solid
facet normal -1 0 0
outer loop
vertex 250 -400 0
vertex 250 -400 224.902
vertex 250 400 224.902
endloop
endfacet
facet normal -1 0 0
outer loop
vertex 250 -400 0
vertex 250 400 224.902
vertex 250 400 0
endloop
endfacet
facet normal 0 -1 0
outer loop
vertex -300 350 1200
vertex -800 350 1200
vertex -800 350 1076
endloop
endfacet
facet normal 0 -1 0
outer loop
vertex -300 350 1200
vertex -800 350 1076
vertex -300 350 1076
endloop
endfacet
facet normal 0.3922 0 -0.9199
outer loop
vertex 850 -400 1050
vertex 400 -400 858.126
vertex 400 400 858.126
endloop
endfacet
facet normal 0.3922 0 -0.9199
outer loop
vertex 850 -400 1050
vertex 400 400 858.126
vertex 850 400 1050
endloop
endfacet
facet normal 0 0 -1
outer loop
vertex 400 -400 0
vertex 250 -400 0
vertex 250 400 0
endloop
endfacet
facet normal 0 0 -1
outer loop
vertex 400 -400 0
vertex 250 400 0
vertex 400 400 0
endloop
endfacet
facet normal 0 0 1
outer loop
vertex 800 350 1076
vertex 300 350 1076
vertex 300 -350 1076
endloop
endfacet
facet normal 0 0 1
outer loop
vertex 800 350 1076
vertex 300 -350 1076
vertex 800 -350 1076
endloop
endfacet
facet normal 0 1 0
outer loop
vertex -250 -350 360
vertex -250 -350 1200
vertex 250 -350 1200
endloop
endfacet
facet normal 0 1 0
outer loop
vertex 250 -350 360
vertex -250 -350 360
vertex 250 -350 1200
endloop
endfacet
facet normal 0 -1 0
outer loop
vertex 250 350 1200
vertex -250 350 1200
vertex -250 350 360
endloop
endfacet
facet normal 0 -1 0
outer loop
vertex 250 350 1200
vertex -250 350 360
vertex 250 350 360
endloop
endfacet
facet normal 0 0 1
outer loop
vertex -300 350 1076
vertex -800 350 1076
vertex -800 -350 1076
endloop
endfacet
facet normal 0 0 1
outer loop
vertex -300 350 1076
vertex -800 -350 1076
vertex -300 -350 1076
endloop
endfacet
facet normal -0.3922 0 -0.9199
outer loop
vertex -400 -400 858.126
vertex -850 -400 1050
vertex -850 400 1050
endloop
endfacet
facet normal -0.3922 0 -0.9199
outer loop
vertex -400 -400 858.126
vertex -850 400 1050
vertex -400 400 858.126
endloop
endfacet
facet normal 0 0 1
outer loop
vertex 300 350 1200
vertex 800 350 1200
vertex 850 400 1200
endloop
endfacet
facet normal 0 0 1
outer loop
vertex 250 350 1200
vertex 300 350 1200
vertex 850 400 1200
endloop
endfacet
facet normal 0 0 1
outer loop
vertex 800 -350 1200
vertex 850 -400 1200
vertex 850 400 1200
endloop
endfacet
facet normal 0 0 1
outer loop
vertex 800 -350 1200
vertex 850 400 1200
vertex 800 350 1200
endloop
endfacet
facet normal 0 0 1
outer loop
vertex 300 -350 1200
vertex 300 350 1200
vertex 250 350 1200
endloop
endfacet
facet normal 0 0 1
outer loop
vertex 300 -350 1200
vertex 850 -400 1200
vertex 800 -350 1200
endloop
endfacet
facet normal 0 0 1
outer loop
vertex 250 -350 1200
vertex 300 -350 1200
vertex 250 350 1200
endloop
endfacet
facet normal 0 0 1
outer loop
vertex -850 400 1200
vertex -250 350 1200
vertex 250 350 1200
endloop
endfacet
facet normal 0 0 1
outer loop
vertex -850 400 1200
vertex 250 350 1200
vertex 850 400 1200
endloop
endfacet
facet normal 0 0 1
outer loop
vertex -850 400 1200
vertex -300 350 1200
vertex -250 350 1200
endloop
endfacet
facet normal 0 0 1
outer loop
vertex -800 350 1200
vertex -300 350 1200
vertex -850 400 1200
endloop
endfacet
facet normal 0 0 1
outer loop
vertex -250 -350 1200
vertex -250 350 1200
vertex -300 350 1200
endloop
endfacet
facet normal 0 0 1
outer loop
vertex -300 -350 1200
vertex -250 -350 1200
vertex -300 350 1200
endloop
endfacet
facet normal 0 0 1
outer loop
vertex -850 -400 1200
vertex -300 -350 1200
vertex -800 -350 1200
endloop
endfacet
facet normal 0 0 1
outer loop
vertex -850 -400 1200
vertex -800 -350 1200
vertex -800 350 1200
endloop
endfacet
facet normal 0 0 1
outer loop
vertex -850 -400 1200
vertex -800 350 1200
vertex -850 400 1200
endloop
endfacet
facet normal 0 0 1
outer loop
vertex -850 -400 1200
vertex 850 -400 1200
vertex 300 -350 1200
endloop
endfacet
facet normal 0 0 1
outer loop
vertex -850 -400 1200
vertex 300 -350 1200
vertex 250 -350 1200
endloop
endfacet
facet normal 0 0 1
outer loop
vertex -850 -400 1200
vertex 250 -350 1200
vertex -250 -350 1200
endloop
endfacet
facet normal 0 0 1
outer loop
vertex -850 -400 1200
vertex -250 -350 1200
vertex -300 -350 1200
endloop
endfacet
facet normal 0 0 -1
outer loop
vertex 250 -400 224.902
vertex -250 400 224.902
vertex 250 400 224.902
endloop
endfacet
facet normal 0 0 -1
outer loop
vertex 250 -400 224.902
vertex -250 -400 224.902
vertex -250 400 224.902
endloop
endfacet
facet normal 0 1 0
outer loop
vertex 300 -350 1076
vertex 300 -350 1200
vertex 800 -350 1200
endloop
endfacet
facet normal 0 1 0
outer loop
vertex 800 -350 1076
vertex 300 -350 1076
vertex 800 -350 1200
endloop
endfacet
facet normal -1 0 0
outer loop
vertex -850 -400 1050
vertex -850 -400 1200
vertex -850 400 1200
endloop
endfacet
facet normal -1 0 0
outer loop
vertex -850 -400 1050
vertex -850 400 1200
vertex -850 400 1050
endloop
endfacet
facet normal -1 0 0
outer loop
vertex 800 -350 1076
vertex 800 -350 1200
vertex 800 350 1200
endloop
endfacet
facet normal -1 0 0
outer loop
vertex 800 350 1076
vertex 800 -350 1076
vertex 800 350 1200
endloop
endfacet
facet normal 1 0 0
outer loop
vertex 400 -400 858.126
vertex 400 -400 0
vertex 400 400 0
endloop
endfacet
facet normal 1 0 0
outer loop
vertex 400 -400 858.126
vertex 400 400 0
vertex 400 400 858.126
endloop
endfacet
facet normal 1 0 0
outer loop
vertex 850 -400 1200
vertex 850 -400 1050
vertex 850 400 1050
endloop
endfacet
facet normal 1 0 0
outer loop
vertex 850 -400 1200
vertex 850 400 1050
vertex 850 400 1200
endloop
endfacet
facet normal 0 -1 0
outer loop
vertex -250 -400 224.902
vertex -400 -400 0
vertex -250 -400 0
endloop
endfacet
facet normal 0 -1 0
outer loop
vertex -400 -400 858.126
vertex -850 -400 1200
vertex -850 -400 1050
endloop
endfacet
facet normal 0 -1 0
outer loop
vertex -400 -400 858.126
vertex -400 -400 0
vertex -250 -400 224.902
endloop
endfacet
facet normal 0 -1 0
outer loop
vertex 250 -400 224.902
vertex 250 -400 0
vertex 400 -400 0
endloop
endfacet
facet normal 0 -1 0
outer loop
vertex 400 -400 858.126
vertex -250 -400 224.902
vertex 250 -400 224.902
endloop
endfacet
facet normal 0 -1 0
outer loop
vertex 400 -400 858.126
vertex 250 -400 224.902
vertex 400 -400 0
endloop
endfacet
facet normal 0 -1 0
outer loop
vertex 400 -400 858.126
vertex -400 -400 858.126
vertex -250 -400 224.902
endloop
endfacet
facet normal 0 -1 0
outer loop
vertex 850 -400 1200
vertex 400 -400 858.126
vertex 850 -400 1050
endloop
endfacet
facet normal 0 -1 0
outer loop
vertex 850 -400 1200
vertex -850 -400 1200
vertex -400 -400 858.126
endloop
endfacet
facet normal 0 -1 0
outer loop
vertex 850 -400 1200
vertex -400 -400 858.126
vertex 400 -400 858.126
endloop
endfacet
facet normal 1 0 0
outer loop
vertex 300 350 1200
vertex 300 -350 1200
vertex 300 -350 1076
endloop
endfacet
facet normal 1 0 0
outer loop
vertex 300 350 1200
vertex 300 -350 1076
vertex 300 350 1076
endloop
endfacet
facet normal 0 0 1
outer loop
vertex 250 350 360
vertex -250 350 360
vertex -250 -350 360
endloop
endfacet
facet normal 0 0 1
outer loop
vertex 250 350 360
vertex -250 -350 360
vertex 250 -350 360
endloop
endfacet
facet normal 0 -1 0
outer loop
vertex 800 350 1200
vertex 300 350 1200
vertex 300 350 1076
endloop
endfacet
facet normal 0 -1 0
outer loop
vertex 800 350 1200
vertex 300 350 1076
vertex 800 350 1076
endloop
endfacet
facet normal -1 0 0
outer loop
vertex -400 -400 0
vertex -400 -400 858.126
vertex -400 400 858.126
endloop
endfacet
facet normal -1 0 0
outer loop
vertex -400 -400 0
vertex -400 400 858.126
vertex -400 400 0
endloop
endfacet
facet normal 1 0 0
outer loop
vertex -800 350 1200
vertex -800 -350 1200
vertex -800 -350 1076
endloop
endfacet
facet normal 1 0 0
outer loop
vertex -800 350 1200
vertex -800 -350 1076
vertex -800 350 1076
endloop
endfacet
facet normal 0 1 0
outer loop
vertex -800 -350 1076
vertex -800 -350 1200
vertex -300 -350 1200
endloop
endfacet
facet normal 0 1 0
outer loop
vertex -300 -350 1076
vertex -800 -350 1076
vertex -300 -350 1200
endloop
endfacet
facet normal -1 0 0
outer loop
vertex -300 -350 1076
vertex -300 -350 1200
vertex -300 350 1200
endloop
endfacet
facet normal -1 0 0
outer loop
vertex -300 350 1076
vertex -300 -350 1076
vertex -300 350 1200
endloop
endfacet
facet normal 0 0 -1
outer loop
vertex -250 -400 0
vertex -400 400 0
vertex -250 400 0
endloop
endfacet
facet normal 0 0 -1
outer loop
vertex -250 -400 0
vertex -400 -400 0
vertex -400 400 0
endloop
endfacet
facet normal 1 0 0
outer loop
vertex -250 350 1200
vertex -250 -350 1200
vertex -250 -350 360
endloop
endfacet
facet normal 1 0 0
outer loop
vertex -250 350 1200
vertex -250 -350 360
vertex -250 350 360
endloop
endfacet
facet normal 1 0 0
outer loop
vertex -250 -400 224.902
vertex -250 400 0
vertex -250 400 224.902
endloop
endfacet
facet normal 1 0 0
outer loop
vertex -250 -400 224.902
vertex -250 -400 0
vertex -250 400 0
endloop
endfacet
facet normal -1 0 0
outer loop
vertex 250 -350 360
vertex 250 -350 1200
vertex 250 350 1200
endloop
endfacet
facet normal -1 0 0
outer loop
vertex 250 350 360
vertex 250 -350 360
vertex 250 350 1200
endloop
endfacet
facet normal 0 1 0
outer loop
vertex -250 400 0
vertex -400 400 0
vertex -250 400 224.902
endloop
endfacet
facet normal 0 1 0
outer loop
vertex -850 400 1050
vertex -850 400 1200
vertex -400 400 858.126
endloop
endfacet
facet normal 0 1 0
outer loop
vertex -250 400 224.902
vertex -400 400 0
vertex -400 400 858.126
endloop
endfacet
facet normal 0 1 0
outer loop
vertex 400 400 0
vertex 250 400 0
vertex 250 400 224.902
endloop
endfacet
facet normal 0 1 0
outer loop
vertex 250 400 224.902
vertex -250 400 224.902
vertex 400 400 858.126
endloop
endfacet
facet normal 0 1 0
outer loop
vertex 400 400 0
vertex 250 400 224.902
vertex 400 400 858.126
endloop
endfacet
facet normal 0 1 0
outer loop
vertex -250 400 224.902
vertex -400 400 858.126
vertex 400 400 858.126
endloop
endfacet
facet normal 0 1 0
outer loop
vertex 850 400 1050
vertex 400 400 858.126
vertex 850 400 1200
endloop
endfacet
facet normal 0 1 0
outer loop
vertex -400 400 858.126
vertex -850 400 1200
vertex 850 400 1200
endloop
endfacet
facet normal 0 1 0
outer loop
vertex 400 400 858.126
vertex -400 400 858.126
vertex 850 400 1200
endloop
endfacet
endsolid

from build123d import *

# Parameters (mm, degrees)
F1_DEPTH = 400
F2_W     = 500
F2_H     = 700
F3_DEPTH = 840
F4_W     = 500
F4_H     = 700
F5_DEPTH = 124


with BuildPart() as f1:
    # F0 (on Front) → F1 (new body, symmetric)
    with BuildSketch(Plane.XZ):
        Polygon((-250, 224.901706), (0, 224.901706), (250, 224.901706), (250, 0), (400, 0), (400, 858.125869), (850, 1050), (850, 1200), (0, 1200), (-850, 1200), (-850, 1050), (-400, 858.125869), (-400, 0), (-250, 0), align=None)
    extrude(amount=F1_DEPTH, both=True)

    # F2 (on face) → F3 (cut)
    with BuildSketch(Plane.XY.offset(1200)):
        Rectangle(F2_W, F2_H)
    extrude(amount=-F3_DEPTH, mode=Mode.SUBTRACT)

    # F4 (on face) → F5 (cut)
    with BuildSketch(Plane.XY.offset(1200)):
        with Locations((-550, 0)):
            Rectangle(F4_W, F4_H)
        with Locations((550, 0)):
            Rectangle(F4_W, F4_H)
    extrude(amount=-F5_DEPTH, mode=Mode.SUBTRACT)


solid = f1.part
